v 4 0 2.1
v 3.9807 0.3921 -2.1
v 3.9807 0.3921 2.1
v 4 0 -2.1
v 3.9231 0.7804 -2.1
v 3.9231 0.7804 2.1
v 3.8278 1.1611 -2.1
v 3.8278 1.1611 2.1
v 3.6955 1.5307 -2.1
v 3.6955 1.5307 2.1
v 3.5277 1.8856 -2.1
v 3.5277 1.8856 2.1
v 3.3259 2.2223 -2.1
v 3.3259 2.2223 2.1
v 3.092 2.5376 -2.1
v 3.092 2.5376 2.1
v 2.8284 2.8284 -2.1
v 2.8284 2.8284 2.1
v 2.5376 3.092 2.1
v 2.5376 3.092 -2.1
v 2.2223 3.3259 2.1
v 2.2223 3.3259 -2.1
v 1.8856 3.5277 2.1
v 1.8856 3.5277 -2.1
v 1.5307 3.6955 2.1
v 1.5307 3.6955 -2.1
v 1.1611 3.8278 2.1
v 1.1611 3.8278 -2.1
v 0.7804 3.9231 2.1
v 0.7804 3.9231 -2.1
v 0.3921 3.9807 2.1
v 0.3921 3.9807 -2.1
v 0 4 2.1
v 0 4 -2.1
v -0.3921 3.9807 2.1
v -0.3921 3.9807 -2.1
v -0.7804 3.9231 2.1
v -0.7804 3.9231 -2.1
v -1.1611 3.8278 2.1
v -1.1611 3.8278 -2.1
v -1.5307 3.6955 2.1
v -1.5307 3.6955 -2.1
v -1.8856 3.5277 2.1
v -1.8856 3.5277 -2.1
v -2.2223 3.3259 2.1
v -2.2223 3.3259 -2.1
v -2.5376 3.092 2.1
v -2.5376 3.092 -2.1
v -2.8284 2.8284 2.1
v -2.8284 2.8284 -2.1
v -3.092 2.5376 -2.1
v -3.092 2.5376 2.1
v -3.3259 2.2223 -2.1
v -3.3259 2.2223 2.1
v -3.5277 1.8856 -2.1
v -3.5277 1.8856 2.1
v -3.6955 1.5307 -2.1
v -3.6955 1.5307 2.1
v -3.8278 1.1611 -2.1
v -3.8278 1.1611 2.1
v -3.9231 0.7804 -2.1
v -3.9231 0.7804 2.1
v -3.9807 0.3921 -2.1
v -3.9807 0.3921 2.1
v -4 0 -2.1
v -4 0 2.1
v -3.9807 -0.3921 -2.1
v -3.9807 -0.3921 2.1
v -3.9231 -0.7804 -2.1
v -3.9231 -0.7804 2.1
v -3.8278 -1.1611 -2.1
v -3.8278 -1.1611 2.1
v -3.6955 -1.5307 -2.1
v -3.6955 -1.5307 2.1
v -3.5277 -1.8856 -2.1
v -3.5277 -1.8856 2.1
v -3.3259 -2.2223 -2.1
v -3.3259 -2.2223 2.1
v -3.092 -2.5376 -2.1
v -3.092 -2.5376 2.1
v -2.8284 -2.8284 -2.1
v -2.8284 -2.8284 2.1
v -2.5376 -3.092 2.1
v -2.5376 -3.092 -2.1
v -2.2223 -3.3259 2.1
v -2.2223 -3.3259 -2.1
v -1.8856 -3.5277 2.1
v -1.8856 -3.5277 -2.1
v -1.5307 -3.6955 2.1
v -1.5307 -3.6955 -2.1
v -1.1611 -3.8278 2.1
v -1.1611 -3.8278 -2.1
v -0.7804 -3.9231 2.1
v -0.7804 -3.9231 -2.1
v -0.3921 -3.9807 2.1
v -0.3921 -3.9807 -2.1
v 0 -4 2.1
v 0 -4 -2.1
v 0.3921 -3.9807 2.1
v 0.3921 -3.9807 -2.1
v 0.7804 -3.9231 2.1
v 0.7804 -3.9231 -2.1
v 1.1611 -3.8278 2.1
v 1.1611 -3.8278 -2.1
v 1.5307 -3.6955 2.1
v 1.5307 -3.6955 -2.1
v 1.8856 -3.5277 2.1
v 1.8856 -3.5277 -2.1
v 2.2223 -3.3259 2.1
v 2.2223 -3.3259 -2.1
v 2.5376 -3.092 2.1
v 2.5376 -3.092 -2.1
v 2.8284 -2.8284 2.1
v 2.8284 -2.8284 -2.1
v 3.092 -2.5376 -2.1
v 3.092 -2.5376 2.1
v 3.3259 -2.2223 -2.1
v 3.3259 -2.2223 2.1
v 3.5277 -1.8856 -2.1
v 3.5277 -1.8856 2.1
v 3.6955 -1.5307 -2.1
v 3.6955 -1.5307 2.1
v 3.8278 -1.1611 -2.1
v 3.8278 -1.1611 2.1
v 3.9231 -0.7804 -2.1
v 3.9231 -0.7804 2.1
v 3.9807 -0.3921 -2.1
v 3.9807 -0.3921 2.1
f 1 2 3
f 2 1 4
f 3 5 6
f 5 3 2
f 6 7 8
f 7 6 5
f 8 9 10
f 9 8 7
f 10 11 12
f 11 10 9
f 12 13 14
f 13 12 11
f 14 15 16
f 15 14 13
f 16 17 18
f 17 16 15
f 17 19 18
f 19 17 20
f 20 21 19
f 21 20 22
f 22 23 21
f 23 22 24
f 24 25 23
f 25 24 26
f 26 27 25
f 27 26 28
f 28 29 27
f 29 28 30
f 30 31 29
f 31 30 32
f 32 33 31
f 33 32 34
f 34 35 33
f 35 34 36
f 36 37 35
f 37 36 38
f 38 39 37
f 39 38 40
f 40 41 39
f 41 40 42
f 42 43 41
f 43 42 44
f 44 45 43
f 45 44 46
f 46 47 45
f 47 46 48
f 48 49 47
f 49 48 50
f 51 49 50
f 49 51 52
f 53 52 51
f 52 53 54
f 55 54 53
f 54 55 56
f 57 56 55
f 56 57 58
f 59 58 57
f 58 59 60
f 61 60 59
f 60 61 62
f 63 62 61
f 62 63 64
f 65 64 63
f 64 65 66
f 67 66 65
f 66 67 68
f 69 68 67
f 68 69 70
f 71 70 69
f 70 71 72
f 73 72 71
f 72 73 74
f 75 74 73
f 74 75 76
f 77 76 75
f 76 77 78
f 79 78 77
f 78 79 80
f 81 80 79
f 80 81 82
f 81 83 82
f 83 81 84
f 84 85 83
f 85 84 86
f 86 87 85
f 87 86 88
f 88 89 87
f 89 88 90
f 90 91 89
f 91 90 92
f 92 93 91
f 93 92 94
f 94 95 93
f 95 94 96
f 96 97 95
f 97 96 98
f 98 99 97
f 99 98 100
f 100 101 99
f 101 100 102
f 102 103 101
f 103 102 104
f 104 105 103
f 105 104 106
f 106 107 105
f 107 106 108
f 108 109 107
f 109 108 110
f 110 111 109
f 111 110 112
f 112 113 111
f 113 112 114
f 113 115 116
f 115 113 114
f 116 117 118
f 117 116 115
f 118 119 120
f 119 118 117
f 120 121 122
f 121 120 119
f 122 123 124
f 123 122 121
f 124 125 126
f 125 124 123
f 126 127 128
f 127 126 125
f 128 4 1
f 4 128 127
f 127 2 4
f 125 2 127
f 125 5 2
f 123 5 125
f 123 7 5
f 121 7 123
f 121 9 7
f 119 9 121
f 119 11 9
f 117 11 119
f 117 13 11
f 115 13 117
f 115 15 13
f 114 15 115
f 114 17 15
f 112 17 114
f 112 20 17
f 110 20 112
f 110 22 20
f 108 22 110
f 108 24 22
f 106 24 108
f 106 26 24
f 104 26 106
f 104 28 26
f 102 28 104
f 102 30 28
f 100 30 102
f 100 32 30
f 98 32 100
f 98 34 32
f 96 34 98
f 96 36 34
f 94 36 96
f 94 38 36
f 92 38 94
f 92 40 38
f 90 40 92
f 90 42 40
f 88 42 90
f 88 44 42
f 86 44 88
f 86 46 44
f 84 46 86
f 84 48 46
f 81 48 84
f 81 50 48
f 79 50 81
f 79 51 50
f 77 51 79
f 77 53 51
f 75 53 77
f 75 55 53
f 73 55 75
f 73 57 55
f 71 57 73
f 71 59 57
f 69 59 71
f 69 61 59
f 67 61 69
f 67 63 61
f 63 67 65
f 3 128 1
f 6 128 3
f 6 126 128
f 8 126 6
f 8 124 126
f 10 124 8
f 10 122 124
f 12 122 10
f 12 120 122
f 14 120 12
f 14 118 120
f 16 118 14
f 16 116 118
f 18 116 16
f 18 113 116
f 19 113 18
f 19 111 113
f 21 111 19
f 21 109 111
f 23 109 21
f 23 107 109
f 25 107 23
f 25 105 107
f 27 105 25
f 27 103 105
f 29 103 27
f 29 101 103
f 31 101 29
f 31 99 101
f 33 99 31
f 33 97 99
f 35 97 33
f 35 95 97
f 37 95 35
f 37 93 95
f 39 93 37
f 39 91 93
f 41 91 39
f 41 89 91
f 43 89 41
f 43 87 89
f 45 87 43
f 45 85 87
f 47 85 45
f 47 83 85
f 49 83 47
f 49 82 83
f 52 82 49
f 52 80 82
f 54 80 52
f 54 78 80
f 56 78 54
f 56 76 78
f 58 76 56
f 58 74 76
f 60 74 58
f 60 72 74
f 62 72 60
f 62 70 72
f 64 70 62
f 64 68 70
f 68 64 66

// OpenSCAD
// Parameters
outer_diameter_mm = 8; //[4:16:0.1]
height_mm = 4.2; //[2.1:8.4:0.1]
inner_diameter_mm = 0; //[0:8:0.1]
bore = 0; //[0:1:1]

// Magnet - complete geometry
module magnet() {
  color([0.72, 0.45, 0.2]) { // Copper-like color for magnet
    // Magnet body
    cylinder(h=height_mm, r=outer_diameter_mm/2, center=true, $fn=64);
  }
}

// Assembly
module assembly() {
  magnet();
}

assembly();
